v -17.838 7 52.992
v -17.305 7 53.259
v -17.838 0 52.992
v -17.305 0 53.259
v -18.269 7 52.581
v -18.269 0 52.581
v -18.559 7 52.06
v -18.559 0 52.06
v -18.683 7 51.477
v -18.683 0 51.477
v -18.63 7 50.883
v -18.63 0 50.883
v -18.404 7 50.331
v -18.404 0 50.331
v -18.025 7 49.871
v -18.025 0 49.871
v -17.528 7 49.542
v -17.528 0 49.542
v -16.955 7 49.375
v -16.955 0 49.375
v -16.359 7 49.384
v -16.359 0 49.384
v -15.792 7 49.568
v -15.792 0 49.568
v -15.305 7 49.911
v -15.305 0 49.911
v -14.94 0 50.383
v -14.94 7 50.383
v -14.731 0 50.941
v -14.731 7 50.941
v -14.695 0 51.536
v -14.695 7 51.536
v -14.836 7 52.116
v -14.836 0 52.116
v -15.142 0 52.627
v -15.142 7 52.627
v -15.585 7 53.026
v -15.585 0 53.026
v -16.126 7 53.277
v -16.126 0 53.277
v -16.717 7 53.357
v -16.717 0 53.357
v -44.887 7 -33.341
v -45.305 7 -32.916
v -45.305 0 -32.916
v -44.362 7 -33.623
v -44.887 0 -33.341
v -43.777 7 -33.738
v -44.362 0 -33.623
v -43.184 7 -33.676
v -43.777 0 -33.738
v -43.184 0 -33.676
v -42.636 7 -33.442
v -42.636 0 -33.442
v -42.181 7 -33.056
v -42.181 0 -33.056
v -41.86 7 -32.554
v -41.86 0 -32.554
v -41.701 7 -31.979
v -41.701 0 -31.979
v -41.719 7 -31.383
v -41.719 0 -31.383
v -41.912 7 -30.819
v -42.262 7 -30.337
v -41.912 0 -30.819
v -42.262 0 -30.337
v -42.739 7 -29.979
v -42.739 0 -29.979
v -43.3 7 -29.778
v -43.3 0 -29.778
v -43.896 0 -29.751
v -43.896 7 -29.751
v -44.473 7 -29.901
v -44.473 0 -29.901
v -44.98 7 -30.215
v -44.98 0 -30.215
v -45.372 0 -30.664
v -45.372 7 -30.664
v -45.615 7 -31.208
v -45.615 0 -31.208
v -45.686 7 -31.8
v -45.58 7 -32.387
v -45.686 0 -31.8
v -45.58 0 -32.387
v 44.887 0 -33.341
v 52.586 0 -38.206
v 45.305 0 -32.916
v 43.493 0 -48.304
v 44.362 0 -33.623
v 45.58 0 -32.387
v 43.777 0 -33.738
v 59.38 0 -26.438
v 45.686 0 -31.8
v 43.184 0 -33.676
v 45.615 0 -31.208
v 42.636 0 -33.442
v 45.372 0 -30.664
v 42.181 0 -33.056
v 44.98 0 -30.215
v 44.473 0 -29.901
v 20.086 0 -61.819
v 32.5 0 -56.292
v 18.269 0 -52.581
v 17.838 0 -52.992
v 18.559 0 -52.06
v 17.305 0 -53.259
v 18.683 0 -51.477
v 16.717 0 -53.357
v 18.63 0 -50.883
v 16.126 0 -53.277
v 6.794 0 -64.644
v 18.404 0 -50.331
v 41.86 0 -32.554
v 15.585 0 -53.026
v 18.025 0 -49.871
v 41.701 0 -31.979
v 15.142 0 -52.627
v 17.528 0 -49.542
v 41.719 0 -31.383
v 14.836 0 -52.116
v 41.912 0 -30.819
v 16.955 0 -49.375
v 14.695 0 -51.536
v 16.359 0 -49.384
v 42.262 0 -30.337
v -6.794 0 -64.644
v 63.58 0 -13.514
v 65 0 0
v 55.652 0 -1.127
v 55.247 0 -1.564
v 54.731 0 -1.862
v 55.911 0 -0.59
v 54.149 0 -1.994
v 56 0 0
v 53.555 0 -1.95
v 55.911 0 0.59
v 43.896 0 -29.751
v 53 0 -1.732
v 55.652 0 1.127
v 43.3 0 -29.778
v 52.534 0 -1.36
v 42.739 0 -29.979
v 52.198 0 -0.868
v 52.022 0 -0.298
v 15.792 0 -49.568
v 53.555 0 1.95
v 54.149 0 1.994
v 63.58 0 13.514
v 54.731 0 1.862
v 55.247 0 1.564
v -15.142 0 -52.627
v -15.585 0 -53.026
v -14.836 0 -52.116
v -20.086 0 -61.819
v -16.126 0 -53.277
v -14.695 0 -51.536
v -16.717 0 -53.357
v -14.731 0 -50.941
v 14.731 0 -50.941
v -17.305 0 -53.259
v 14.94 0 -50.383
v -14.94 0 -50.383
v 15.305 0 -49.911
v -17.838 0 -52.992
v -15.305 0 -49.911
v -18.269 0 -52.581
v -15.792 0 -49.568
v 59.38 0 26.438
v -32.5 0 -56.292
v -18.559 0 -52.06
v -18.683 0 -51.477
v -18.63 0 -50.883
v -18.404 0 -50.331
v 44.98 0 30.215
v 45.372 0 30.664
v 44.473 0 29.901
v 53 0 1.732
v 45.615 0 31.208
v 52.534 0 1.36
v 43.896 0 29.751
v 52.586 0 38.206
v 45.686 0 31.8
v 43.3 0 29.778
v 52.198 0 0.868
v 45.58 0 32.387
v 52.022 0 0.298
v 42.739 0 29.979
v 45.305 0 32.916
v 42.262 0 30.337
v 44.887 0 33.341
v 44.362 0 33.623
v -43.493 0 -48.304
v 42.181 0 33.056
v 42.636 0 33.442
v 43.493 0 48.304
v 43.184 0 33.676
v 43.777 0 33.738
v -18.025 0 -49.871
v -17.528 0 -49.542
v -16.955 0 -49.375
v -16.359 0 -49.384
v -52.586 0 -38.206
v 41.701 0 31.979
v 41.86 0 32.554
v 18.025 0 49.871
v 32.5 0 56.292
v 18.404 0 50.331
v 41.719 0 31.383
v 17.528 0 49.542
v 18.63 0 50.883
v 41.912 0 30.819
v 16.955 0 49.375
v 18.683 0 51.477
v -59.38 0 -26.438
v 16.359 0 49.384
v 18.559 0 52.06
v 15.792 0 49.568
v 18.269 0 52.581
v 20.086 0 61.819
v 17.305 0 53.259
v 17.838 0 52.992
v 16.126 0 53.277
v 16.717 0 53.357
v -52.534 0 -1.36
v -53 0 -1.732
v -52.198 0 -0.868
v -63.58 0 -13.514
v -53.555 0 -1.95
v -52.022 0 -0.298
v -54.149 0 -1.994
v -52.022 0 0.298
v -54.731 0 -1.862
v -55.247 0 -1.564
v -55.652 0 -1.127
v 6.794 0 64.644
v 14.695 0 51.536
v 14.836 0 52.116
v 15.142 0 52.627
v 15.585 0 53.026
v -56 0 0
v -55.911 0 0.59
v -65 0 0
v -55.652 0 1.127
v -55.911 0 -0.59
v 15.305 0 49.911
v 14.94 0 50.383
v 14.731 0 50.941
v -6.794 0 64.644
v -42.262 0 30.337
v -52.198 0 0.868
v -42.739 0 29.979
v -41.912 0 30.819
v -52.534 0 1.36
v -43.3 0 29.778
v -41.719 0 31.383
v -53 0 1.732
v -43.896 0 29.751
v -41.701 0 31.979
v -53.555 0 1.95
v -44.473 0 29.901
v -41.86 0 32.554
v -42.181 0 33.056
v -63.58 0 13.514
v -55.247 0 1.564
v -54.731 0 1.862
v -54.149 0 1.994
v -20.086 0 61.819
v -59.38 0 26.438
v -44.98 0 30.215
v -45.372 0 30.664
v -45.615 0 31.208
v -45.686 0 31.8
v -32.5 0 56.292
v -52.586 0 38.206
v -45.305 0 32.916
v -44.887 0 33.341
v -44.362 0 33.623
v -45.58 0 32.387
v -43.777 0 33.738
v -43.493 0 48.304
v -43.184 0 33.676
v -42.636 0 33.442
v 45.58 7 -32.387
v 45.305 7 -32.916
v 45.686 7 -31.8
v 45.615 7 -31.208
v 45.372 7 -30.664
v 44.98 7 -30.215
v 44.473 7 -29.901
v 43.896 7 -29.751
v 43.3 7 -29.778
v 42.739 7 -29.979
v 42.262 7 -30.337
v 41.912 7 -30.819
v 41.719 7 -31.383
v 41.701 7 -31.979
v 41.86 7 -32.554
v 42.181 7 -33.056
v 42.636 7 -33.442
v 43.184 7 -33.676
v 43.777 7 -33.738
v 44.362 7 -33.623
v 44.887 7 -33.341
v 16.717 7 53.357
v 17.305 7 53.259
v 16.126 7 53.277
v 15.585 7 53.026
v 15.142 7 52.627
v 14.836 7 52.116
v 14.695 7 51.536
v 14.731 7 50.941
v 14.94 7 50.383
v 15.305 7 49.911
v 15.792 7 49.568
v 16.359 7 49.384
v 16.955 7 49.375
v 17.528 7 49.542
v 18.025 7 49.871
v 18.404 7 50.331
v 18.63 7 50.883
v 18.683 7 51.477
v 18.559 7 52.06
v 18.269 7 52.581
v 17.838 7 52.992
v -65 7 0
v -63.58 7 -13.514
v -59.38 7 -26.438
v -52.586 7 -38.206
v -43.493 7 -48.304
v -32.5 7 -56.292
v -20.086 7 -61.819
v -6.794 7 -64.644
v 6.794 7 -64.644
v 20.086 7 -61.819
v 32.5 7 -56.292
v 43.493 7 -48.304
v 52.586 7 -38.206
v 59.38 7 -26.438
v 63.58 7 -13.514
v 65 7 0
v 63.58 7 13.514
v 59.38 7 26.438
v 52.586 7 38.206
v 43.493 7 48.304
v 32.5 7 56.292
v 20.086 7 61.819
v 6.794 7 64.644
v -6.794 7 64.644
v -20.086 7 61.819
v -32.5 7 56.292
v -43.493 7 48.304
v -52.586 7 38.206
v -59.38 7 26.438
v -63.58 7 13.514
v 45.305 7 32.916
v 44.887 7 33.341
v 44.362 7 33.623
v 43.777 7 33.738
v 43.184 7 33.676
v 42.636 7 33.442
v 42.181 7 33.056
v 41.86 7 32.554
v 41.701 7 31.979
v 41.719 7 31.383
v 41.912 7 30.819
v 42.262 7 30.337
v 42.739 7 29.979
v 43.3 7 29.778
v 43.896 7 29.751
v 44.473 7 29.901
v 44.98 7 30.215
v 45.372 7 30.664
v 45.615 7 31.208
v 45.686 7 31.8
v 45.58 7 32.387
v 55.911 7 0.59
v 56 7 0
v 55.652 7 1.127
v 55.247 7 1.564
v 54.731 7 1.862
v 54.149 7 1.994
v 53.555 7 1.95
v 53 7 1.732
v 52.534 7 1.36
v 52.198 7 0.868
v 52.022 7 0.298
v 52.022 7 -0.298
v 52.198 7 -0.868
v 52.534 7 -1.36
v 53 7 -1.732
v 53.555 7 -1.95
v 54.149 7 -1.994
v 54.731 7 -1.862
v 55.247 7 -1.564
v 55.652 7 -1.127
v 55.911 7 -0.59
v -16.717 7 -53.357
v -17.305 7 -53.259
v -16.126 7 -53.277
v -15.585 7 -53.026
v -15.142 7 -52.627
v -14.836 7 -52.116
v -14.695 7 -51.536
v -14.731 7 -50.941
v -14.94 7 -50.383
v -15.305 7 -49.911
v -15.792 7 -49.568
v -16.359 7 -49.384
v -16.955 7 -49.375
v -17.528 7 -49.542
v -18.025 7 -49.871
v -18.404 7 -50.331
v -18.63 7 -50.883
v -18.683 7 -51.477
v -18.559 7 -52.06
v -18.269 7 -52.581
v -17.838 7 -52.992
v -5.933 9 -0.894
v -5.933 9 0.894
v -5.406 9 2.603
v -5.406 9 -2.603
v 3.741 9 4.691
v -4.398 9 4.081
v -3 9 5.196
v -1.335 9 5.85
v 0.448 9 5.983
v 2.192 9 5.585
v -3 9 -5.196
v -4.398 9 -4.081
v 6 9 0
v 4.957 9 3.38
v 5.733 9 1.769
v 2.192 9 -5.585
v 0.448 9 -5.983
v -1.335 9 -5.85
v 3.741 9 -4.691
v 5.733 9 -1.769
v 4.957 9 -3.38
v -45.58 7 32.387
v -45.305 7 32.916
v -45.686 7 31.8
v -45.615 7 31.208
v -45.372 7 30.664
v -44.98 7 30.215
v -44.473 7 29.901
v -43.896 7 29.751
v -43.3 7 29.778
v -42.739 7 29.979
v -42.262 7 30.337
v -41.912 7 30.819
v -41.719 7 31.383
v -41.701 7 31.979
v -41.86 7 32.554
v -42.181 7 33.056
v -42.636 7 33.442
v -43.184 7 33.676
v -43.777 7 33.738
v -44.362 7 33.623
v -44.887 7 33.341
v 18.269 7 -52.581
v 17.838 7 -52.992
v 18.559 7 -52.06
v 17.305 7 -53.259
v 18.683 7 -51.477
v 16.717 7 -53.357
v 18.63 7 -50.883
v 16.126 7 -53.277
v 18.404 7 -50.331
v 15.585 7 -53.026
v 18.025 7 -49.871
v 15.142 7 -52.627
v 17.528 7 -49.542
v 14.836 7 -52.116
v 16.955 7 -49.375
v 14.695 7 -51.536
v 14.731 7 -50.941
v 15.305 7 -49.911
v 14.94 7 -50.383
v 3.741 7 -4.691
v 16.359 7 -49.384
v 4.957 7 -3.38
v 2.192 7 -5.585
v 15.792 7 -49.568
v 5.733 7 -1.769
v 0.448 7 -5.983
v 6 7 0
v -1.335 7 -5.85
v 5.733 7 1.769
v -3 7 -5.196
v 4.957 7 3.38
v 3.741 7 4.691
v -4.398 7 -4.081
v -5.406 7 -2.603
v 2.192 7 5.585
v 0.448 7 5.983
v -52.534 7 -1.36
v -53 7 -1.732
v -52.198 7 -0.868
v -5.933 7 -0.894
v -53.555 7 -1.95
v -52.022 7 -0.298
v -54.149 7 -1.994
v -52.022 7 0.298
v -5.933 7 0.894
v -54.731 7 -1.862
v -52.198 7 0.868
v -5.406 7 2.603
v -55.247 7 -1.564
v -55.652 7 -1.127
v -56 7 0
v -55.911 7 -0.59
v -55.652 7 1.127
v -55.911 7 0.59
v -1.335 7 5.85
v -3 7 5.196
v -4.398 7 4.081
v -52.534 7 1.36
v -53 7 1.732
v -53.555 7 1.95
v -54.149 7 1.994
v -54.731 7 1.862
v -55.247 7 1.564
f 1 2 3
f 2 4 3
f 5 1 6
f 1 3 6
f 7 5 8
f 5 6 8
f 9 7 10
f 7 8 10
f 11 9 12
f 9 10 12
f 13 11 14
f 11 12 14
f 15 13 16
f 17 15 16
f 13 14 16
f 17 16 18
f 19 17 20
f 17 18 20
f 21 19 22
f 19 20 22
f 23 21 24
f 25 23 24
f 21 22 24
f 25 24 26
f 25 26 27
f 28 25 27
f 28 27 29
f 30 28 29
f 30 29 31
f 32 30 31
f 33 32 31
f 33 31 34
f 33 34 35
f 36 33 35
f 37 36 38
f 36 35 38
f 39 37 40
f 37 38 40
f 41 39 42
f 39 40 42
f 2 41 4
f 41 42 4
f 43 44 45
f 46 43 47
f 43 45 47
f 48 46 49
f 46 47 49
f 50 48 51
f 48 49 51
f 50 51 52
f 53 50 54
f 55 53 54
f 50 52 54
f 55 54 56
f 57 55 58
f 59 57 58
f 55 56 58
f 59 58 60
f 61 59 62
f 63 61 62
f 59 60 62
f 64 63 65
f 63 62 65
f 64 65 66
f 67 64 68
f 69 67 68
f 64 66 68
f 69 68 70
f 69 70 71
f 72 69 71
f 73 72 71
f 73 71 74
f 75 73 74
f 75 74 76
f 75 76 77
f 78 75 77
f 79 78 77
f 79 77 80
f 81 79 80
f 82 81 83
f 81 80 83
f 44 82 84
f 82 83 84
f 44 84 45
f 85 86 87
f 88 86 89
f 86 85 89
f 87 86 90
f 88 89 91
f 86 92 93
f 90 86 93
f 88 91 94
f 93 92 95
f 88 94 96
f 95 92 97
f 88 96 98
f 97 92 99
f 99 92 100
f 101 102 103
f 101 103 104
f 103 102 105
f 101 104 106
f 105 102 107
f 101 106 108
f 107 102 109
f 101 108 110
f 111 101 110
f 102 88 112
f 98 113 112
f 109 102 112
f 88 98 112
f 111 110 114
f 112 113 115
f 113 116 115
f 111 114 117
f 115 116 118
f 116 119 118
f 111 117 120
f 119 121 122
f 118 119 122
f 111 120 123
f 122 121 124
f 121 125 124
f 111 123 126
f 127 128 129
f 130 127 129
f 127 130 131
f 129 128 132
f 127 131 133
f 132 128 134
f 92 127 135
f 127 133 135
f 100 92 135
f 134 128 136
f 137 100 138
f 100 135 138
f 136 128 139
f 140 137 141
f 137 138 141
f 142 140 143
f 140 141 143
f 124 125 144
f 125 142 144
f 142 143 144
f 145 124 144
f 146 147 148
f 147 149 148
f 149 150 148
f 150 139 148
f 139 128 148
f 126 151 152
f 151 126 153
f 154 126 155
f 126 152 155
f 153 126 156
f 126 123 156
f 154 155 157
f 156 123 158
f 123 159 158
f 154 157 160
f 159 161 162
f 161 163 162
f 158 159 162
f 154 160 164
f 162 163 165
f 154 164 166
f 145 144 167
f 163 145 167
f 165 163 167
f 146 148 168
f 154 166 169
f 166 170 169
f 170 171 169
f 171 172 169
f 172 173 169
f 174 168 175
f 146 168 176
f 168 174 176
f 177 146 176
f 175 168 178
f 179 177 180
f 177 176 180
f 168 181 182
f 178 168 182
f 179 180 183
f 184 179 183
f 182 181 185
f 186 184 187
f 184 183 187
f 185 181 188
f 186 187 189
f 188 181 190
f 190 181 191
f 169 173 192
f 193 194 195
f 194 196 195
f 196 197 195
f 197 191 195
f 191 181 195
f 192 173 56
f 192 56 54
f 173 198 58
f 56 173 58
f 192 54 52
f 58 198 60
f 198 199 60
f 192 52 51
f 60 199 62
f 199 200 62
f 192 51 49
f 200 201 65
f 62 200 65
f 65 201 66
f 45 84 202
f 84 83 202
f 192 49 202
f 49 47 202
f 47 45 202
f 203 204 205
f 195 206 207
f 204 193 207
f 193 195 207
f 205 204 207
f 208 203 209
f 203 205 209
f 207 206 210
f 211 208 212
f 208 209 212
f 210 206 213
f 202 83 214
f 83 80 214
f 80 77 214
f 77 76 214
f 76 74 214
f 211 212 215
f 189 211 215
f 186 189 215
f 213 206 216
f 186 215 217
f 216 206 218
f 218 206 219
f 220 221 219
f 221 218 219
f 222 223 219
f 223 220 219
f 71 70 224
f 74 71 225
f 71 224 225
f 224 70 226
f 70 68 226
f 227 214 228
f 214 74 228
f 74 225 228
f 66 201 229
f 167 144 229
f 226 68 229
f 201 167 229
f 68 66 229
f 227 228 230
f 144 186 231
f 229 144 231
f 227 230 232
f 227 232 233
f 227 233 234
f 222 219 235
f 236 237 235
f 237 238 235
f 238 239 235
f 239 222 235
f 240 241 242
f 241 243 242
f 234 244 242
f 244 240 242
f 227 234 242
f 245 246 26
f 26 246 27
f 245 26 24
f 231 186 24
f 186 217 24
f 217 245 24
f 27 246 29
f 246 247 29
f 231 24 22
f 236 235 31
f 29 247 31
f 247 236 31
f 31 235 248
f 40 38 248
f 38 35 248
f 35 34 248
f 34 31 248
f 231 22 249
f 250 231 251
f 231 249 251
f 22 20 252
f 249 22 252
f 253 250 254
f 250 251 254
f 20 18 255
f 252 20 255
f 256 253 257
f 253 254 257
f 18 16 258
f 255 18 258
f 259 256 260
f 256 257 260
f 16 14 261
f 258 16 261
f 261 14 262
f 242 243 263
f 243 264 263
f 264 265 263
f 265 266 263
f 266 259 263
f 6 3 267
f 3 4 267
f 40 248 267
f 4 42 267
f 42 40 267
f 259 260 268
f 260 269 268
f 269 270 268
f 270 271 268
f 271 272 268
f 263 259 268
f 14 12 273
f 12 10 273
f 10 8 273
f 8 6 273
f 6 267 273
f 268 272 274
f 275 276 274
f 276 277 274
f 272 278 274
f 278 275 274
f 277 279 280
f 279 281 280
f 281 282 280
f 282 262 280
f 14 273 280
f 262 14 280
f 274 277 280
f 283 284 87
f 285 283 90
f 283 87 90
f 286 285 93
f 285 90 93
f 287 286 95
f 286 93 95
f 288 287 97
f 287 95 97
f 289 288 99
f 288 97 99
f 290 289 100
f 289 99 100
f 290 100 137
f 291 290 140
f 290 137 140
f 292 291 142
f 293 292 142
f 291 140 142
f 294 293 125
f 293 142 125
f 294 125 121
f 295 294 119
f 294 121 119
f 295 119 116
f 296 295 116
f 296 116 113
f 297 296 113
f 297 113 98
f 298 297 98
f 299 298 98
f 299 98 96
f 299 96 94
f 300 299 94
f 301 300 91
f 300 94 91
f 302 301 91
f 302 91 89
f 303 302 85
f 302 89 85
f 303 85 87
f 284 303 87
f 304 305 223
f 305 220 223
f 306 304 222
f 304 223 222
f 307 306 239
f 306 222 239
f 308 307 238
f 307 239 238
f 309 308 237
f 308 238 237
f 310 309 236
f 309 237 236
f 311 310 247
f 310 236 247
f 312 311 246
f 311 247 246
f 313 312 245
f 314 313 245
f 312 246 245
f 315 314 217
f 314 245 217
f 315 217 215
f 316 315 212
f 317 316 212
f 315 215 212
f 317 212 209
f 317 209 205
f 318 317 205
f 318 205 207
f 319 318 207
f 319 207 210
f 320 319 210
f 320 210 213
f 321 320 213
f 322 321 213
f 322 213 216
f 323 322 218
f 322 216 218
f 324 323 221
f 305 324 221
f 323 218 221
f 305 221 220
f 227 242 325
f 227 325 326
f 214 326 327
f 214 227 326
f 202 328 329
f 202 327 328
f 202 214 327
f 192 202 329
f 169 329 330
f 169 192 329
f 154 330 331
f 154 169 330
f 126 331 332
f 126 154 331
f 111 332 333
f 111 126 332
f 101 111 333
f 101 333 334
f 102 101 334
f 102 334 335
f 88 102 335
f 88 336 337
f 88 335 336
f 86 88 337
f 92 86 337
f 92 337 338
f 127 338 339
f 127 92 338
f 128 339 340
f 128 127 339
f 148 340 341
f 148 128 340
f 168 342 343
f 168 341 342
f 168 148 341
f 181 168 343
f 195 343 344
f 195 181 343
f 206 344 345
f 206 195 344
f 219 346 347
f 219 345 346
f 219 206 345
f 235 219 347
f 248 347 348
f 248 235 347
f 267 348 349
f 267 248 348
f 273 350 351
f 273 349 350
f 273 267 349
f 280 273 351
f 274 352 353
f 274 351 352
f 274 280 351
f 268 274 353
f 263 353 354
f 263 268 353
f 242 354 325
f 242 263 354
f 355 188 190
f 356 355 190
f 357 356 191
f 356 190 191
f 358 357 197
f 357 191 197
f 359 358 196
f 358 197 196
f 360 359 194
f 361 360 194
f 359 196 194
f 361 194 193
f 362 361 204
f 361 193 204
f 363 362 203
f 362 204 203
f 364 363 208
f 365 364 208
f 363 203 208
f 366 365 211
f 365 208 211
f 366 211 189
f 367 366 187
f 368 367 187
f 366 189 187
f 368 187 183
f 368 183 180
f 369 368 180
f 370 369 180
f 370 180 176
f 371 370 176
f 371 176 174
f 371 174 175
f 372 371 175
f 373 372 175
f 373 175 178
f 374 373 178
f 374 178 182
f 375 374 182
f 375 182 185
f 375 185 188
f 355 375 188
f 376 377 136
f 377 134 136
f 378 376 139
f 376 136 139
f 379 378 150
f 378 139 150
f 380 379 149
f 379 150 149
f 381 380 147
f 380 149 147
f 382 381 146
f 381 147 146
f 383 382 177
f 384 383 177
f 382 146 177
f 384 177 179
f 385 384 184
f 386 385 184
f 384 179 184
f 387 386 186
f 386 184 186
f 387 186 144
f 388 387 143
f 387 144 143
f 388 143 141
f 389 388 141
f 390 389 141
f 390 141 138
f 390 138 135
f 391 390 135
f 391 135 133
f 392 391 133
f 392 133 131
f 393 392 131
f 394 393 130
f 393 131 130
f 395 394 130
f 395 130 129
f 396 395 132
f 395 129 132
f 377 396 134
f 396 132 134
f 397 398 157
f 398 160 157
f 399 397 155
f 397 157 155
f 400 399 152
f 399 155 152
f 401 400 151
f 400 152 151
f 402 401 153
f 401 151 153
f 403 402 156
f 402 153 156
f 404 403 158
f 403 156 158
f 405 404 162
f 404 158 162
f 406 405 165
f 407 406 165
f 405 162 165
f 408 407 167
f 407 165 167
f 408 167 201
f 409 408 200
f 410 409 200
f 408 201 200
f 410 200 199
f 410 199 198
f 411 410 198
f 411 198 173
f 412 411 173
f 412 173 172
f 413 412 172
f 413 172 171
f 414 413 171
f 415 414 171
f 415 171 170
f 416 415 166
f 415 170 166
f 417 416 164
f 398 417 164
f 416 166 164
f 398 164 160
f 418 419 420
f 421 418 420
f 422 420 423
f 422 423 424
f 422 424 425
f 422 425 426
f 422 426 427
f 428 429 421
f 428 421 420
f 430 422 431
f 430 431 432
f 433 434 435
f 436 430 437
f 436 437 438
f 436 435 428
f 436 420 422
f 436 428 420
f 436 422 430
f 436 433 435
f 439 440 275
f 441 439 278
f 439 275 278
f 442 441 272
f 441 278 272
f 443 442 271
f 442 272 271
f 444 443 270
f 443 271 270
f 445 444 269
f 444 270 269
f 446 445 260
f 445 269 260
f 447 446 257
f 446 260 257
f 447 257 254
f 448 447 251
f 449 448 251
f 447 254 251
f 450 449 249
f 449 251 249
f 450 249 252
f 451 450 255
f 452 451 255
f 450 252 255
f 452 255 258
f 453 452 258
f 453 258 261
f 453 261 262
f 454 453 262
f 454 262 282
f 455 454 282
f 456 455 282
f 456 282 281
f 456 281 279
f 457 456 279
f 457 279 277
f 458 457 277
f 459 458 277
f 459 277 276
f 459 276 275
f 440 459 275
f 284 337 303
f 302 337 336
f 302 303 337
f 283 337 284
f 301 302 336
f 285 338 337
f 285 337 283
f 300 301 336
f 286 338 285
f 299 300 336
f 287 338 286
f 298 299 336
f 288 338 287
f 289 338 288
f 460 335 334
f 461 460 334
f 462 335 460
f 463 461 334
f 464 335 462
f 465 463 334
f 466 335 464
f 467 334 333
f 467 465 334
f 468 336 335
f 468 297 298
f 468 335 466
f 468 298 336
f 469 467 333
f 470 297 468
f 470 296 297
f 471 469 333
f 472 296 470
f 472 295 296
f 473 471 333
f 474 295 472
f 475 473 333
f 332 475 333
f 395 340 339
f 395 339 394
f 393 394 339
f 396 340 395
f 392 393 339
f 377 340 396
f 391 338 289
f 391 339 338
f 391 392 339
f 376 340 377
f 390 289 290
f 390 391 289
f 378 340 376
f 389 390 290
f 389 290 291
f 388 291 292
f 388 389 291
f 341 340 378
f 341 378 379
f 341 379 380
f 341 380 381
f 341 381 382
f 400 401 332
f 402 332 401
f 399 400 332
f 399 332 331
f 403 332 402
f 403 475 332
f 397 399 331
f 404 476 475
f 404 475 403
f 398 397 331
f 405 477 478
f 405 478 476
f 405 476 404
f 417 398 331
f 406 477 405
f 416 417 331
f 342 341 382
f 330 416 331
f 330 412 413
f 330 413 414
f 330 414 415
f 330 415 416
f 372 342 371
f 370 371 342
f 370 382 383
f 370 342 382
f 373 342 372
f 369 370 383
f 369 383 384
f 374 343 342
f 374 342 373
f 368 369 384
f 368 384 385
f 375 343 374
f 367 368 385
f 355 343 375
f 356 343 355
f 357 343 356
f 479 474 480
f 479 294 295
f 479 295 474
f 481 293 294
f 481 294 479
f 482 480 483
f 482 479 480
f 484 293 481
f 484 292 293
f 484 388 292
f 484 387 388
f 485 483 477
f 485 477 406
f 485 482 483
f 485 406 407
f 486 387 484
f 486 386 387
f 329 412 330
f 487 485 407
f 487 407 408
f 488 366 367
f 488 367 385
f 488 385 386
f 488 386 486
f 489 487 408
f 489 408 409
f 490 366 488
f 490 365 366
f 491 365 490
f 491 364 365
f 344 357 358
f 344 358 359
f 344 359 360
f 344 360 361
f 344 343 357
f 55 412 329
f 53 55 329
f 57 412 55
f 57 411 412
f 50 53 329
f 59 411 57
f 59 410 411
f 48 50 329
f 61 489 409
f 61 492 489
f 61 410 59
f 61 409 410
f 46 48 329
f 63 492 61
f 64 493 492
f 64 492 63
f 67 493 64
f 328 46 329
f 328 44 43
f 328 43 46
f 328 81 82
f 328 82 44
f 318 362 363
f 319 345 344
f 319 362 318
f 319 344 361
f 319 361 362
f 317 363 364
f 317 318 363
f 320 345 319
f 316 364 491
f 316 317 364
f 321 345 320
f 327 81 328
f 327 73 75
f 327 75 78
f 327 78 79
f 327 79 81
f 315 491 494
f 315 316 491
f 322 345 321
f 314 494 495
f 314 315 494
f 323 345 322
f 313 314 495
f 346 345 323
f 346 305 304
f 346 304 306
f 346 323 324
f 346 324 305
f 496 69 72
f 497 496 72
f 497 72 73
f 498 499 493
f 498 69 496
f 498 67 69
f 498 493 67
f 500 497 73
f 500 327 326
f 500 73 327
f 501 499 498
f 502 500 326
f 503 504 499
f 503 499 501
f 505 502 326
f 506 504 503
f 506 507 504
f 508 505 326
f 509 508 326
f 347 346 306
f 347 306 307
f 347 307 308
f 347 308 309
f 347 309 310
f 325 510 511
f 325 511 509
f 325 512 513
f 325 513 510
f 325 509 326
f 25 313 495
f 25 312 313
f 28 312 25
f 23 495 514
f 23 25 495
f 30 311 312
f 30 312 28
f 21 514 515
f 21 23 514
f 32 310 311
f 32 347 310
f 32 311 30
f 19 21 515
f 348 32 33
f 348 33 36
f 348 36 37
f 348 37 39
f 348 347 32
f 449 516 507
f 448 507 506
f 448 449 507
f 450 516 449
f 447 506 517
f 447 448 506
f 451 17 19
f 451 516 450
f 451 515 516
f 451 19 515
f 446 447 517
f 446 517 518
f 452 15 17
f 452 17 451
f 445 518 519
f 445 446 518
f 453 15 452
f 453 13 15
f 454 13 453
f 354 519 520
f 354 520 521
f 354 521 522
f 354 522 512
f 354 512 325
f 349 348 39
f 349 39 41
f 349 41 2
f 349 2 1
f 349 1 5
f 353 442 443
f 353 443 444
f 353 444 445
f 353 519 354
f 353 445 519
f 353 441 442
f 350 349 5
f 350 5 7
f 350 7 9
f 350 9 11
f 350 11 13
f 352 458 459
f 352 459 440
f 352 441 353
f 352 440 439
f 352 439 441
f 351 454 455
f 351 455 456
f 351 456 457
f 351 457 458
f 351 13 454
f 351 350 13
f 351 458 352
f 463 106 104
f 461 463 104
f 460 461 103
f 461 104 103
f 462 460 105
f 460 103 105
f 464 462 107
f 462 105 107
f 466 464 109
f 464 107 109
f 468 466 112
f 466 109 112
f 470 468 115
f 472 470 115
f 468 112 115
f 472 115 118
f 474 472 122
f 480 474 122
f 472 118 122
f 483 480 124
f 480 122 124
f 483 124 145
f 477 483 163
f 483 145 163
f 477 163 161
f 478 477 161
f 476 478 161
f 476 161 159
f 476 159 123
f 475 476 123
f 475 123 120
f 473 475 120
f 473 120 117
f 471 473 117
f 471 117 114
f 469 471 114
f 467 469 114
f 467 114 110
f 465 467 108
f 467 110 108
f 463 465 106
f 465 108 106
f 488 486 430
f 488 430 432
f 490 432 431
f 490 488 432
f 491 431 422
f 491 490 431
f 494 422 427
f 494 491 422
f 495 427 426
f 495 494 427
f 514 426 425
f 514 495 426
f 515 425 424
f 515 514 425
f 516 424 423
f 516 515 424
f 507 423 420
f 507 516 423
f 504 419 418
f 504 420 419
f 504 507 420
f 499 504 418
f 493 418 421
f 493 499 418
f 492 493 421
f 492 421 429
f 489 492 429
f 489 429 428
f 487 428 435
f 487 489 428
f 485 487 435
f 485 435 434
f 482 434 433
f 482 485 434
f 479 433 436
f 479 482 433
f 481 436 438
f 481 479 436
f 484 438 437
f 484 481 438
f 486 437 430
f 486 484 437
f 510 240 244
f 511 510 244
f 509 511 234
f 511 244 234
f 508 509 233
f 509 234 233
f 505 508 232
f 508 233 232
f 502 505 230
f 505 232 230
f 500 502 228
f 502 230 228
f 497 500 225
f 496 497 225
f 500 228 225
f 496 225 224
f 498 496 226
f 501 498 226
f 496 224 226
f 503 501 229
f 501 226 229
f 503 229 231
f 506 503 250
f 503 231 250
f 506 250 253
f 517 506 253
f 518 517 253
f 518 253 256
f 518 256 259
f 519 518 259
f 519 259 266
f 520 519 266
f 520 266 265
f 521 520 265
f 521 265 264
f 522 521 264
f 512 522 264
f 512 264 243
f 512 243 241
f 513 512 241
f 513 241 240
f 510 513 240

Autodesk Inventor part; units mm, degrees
ref_plane "YZ Plane" through (0, 0, 0) normal (1, 0, 0) x (0, 1, 0)
ref_plane "XZ Plane" through (0, 0, 0) normal (0, 1, 0) x (-1, 0, 0)
ref_plane "XY Plane" through (0, 0, 0) normal (0, 0, 1) x (1, 0, 0)
sketch "Sketch1" plane through (0, 0, 0) normal (0, 1, 0) x (-1, 0, 0)
  circle A0 centre (0, 0) radius 65
  dimension "d0" = 130
extrude "Extrusion1" add sketch "Sketch1" along normal blind 7
sketch "Sketch5" plane through (0, 7, 0) normal (0, 1, 0) x (1, 0, 0)
  circle A0 centre (0, 0) radius 6
  dimension "d27" = 12
extrude "Extrusion5" add sketch "Sketch5" along normal blind 2
sketch "Sketch7" plane through (0, 0, 0) normal (0, -1, 0) x (1, 0, 0)
  circle A0 centre (0, 0) radius 65 projected
  line L0 (0, 0) -> (54, 0)
  circle A1 centre (54, 0) radius 2
  dimension "d37" = 4
  dimension "d38" = 54
extrude "Extrusion7" cut sketch "Sketch7" against normal blind 10 contours A1
pattern_circular "Circular Pattern1" count 10 over 360 about axis through (0, 0, 0) along (0, -1, 0) of "Extrusion7"
properties part number "bay container 10 bottom"
